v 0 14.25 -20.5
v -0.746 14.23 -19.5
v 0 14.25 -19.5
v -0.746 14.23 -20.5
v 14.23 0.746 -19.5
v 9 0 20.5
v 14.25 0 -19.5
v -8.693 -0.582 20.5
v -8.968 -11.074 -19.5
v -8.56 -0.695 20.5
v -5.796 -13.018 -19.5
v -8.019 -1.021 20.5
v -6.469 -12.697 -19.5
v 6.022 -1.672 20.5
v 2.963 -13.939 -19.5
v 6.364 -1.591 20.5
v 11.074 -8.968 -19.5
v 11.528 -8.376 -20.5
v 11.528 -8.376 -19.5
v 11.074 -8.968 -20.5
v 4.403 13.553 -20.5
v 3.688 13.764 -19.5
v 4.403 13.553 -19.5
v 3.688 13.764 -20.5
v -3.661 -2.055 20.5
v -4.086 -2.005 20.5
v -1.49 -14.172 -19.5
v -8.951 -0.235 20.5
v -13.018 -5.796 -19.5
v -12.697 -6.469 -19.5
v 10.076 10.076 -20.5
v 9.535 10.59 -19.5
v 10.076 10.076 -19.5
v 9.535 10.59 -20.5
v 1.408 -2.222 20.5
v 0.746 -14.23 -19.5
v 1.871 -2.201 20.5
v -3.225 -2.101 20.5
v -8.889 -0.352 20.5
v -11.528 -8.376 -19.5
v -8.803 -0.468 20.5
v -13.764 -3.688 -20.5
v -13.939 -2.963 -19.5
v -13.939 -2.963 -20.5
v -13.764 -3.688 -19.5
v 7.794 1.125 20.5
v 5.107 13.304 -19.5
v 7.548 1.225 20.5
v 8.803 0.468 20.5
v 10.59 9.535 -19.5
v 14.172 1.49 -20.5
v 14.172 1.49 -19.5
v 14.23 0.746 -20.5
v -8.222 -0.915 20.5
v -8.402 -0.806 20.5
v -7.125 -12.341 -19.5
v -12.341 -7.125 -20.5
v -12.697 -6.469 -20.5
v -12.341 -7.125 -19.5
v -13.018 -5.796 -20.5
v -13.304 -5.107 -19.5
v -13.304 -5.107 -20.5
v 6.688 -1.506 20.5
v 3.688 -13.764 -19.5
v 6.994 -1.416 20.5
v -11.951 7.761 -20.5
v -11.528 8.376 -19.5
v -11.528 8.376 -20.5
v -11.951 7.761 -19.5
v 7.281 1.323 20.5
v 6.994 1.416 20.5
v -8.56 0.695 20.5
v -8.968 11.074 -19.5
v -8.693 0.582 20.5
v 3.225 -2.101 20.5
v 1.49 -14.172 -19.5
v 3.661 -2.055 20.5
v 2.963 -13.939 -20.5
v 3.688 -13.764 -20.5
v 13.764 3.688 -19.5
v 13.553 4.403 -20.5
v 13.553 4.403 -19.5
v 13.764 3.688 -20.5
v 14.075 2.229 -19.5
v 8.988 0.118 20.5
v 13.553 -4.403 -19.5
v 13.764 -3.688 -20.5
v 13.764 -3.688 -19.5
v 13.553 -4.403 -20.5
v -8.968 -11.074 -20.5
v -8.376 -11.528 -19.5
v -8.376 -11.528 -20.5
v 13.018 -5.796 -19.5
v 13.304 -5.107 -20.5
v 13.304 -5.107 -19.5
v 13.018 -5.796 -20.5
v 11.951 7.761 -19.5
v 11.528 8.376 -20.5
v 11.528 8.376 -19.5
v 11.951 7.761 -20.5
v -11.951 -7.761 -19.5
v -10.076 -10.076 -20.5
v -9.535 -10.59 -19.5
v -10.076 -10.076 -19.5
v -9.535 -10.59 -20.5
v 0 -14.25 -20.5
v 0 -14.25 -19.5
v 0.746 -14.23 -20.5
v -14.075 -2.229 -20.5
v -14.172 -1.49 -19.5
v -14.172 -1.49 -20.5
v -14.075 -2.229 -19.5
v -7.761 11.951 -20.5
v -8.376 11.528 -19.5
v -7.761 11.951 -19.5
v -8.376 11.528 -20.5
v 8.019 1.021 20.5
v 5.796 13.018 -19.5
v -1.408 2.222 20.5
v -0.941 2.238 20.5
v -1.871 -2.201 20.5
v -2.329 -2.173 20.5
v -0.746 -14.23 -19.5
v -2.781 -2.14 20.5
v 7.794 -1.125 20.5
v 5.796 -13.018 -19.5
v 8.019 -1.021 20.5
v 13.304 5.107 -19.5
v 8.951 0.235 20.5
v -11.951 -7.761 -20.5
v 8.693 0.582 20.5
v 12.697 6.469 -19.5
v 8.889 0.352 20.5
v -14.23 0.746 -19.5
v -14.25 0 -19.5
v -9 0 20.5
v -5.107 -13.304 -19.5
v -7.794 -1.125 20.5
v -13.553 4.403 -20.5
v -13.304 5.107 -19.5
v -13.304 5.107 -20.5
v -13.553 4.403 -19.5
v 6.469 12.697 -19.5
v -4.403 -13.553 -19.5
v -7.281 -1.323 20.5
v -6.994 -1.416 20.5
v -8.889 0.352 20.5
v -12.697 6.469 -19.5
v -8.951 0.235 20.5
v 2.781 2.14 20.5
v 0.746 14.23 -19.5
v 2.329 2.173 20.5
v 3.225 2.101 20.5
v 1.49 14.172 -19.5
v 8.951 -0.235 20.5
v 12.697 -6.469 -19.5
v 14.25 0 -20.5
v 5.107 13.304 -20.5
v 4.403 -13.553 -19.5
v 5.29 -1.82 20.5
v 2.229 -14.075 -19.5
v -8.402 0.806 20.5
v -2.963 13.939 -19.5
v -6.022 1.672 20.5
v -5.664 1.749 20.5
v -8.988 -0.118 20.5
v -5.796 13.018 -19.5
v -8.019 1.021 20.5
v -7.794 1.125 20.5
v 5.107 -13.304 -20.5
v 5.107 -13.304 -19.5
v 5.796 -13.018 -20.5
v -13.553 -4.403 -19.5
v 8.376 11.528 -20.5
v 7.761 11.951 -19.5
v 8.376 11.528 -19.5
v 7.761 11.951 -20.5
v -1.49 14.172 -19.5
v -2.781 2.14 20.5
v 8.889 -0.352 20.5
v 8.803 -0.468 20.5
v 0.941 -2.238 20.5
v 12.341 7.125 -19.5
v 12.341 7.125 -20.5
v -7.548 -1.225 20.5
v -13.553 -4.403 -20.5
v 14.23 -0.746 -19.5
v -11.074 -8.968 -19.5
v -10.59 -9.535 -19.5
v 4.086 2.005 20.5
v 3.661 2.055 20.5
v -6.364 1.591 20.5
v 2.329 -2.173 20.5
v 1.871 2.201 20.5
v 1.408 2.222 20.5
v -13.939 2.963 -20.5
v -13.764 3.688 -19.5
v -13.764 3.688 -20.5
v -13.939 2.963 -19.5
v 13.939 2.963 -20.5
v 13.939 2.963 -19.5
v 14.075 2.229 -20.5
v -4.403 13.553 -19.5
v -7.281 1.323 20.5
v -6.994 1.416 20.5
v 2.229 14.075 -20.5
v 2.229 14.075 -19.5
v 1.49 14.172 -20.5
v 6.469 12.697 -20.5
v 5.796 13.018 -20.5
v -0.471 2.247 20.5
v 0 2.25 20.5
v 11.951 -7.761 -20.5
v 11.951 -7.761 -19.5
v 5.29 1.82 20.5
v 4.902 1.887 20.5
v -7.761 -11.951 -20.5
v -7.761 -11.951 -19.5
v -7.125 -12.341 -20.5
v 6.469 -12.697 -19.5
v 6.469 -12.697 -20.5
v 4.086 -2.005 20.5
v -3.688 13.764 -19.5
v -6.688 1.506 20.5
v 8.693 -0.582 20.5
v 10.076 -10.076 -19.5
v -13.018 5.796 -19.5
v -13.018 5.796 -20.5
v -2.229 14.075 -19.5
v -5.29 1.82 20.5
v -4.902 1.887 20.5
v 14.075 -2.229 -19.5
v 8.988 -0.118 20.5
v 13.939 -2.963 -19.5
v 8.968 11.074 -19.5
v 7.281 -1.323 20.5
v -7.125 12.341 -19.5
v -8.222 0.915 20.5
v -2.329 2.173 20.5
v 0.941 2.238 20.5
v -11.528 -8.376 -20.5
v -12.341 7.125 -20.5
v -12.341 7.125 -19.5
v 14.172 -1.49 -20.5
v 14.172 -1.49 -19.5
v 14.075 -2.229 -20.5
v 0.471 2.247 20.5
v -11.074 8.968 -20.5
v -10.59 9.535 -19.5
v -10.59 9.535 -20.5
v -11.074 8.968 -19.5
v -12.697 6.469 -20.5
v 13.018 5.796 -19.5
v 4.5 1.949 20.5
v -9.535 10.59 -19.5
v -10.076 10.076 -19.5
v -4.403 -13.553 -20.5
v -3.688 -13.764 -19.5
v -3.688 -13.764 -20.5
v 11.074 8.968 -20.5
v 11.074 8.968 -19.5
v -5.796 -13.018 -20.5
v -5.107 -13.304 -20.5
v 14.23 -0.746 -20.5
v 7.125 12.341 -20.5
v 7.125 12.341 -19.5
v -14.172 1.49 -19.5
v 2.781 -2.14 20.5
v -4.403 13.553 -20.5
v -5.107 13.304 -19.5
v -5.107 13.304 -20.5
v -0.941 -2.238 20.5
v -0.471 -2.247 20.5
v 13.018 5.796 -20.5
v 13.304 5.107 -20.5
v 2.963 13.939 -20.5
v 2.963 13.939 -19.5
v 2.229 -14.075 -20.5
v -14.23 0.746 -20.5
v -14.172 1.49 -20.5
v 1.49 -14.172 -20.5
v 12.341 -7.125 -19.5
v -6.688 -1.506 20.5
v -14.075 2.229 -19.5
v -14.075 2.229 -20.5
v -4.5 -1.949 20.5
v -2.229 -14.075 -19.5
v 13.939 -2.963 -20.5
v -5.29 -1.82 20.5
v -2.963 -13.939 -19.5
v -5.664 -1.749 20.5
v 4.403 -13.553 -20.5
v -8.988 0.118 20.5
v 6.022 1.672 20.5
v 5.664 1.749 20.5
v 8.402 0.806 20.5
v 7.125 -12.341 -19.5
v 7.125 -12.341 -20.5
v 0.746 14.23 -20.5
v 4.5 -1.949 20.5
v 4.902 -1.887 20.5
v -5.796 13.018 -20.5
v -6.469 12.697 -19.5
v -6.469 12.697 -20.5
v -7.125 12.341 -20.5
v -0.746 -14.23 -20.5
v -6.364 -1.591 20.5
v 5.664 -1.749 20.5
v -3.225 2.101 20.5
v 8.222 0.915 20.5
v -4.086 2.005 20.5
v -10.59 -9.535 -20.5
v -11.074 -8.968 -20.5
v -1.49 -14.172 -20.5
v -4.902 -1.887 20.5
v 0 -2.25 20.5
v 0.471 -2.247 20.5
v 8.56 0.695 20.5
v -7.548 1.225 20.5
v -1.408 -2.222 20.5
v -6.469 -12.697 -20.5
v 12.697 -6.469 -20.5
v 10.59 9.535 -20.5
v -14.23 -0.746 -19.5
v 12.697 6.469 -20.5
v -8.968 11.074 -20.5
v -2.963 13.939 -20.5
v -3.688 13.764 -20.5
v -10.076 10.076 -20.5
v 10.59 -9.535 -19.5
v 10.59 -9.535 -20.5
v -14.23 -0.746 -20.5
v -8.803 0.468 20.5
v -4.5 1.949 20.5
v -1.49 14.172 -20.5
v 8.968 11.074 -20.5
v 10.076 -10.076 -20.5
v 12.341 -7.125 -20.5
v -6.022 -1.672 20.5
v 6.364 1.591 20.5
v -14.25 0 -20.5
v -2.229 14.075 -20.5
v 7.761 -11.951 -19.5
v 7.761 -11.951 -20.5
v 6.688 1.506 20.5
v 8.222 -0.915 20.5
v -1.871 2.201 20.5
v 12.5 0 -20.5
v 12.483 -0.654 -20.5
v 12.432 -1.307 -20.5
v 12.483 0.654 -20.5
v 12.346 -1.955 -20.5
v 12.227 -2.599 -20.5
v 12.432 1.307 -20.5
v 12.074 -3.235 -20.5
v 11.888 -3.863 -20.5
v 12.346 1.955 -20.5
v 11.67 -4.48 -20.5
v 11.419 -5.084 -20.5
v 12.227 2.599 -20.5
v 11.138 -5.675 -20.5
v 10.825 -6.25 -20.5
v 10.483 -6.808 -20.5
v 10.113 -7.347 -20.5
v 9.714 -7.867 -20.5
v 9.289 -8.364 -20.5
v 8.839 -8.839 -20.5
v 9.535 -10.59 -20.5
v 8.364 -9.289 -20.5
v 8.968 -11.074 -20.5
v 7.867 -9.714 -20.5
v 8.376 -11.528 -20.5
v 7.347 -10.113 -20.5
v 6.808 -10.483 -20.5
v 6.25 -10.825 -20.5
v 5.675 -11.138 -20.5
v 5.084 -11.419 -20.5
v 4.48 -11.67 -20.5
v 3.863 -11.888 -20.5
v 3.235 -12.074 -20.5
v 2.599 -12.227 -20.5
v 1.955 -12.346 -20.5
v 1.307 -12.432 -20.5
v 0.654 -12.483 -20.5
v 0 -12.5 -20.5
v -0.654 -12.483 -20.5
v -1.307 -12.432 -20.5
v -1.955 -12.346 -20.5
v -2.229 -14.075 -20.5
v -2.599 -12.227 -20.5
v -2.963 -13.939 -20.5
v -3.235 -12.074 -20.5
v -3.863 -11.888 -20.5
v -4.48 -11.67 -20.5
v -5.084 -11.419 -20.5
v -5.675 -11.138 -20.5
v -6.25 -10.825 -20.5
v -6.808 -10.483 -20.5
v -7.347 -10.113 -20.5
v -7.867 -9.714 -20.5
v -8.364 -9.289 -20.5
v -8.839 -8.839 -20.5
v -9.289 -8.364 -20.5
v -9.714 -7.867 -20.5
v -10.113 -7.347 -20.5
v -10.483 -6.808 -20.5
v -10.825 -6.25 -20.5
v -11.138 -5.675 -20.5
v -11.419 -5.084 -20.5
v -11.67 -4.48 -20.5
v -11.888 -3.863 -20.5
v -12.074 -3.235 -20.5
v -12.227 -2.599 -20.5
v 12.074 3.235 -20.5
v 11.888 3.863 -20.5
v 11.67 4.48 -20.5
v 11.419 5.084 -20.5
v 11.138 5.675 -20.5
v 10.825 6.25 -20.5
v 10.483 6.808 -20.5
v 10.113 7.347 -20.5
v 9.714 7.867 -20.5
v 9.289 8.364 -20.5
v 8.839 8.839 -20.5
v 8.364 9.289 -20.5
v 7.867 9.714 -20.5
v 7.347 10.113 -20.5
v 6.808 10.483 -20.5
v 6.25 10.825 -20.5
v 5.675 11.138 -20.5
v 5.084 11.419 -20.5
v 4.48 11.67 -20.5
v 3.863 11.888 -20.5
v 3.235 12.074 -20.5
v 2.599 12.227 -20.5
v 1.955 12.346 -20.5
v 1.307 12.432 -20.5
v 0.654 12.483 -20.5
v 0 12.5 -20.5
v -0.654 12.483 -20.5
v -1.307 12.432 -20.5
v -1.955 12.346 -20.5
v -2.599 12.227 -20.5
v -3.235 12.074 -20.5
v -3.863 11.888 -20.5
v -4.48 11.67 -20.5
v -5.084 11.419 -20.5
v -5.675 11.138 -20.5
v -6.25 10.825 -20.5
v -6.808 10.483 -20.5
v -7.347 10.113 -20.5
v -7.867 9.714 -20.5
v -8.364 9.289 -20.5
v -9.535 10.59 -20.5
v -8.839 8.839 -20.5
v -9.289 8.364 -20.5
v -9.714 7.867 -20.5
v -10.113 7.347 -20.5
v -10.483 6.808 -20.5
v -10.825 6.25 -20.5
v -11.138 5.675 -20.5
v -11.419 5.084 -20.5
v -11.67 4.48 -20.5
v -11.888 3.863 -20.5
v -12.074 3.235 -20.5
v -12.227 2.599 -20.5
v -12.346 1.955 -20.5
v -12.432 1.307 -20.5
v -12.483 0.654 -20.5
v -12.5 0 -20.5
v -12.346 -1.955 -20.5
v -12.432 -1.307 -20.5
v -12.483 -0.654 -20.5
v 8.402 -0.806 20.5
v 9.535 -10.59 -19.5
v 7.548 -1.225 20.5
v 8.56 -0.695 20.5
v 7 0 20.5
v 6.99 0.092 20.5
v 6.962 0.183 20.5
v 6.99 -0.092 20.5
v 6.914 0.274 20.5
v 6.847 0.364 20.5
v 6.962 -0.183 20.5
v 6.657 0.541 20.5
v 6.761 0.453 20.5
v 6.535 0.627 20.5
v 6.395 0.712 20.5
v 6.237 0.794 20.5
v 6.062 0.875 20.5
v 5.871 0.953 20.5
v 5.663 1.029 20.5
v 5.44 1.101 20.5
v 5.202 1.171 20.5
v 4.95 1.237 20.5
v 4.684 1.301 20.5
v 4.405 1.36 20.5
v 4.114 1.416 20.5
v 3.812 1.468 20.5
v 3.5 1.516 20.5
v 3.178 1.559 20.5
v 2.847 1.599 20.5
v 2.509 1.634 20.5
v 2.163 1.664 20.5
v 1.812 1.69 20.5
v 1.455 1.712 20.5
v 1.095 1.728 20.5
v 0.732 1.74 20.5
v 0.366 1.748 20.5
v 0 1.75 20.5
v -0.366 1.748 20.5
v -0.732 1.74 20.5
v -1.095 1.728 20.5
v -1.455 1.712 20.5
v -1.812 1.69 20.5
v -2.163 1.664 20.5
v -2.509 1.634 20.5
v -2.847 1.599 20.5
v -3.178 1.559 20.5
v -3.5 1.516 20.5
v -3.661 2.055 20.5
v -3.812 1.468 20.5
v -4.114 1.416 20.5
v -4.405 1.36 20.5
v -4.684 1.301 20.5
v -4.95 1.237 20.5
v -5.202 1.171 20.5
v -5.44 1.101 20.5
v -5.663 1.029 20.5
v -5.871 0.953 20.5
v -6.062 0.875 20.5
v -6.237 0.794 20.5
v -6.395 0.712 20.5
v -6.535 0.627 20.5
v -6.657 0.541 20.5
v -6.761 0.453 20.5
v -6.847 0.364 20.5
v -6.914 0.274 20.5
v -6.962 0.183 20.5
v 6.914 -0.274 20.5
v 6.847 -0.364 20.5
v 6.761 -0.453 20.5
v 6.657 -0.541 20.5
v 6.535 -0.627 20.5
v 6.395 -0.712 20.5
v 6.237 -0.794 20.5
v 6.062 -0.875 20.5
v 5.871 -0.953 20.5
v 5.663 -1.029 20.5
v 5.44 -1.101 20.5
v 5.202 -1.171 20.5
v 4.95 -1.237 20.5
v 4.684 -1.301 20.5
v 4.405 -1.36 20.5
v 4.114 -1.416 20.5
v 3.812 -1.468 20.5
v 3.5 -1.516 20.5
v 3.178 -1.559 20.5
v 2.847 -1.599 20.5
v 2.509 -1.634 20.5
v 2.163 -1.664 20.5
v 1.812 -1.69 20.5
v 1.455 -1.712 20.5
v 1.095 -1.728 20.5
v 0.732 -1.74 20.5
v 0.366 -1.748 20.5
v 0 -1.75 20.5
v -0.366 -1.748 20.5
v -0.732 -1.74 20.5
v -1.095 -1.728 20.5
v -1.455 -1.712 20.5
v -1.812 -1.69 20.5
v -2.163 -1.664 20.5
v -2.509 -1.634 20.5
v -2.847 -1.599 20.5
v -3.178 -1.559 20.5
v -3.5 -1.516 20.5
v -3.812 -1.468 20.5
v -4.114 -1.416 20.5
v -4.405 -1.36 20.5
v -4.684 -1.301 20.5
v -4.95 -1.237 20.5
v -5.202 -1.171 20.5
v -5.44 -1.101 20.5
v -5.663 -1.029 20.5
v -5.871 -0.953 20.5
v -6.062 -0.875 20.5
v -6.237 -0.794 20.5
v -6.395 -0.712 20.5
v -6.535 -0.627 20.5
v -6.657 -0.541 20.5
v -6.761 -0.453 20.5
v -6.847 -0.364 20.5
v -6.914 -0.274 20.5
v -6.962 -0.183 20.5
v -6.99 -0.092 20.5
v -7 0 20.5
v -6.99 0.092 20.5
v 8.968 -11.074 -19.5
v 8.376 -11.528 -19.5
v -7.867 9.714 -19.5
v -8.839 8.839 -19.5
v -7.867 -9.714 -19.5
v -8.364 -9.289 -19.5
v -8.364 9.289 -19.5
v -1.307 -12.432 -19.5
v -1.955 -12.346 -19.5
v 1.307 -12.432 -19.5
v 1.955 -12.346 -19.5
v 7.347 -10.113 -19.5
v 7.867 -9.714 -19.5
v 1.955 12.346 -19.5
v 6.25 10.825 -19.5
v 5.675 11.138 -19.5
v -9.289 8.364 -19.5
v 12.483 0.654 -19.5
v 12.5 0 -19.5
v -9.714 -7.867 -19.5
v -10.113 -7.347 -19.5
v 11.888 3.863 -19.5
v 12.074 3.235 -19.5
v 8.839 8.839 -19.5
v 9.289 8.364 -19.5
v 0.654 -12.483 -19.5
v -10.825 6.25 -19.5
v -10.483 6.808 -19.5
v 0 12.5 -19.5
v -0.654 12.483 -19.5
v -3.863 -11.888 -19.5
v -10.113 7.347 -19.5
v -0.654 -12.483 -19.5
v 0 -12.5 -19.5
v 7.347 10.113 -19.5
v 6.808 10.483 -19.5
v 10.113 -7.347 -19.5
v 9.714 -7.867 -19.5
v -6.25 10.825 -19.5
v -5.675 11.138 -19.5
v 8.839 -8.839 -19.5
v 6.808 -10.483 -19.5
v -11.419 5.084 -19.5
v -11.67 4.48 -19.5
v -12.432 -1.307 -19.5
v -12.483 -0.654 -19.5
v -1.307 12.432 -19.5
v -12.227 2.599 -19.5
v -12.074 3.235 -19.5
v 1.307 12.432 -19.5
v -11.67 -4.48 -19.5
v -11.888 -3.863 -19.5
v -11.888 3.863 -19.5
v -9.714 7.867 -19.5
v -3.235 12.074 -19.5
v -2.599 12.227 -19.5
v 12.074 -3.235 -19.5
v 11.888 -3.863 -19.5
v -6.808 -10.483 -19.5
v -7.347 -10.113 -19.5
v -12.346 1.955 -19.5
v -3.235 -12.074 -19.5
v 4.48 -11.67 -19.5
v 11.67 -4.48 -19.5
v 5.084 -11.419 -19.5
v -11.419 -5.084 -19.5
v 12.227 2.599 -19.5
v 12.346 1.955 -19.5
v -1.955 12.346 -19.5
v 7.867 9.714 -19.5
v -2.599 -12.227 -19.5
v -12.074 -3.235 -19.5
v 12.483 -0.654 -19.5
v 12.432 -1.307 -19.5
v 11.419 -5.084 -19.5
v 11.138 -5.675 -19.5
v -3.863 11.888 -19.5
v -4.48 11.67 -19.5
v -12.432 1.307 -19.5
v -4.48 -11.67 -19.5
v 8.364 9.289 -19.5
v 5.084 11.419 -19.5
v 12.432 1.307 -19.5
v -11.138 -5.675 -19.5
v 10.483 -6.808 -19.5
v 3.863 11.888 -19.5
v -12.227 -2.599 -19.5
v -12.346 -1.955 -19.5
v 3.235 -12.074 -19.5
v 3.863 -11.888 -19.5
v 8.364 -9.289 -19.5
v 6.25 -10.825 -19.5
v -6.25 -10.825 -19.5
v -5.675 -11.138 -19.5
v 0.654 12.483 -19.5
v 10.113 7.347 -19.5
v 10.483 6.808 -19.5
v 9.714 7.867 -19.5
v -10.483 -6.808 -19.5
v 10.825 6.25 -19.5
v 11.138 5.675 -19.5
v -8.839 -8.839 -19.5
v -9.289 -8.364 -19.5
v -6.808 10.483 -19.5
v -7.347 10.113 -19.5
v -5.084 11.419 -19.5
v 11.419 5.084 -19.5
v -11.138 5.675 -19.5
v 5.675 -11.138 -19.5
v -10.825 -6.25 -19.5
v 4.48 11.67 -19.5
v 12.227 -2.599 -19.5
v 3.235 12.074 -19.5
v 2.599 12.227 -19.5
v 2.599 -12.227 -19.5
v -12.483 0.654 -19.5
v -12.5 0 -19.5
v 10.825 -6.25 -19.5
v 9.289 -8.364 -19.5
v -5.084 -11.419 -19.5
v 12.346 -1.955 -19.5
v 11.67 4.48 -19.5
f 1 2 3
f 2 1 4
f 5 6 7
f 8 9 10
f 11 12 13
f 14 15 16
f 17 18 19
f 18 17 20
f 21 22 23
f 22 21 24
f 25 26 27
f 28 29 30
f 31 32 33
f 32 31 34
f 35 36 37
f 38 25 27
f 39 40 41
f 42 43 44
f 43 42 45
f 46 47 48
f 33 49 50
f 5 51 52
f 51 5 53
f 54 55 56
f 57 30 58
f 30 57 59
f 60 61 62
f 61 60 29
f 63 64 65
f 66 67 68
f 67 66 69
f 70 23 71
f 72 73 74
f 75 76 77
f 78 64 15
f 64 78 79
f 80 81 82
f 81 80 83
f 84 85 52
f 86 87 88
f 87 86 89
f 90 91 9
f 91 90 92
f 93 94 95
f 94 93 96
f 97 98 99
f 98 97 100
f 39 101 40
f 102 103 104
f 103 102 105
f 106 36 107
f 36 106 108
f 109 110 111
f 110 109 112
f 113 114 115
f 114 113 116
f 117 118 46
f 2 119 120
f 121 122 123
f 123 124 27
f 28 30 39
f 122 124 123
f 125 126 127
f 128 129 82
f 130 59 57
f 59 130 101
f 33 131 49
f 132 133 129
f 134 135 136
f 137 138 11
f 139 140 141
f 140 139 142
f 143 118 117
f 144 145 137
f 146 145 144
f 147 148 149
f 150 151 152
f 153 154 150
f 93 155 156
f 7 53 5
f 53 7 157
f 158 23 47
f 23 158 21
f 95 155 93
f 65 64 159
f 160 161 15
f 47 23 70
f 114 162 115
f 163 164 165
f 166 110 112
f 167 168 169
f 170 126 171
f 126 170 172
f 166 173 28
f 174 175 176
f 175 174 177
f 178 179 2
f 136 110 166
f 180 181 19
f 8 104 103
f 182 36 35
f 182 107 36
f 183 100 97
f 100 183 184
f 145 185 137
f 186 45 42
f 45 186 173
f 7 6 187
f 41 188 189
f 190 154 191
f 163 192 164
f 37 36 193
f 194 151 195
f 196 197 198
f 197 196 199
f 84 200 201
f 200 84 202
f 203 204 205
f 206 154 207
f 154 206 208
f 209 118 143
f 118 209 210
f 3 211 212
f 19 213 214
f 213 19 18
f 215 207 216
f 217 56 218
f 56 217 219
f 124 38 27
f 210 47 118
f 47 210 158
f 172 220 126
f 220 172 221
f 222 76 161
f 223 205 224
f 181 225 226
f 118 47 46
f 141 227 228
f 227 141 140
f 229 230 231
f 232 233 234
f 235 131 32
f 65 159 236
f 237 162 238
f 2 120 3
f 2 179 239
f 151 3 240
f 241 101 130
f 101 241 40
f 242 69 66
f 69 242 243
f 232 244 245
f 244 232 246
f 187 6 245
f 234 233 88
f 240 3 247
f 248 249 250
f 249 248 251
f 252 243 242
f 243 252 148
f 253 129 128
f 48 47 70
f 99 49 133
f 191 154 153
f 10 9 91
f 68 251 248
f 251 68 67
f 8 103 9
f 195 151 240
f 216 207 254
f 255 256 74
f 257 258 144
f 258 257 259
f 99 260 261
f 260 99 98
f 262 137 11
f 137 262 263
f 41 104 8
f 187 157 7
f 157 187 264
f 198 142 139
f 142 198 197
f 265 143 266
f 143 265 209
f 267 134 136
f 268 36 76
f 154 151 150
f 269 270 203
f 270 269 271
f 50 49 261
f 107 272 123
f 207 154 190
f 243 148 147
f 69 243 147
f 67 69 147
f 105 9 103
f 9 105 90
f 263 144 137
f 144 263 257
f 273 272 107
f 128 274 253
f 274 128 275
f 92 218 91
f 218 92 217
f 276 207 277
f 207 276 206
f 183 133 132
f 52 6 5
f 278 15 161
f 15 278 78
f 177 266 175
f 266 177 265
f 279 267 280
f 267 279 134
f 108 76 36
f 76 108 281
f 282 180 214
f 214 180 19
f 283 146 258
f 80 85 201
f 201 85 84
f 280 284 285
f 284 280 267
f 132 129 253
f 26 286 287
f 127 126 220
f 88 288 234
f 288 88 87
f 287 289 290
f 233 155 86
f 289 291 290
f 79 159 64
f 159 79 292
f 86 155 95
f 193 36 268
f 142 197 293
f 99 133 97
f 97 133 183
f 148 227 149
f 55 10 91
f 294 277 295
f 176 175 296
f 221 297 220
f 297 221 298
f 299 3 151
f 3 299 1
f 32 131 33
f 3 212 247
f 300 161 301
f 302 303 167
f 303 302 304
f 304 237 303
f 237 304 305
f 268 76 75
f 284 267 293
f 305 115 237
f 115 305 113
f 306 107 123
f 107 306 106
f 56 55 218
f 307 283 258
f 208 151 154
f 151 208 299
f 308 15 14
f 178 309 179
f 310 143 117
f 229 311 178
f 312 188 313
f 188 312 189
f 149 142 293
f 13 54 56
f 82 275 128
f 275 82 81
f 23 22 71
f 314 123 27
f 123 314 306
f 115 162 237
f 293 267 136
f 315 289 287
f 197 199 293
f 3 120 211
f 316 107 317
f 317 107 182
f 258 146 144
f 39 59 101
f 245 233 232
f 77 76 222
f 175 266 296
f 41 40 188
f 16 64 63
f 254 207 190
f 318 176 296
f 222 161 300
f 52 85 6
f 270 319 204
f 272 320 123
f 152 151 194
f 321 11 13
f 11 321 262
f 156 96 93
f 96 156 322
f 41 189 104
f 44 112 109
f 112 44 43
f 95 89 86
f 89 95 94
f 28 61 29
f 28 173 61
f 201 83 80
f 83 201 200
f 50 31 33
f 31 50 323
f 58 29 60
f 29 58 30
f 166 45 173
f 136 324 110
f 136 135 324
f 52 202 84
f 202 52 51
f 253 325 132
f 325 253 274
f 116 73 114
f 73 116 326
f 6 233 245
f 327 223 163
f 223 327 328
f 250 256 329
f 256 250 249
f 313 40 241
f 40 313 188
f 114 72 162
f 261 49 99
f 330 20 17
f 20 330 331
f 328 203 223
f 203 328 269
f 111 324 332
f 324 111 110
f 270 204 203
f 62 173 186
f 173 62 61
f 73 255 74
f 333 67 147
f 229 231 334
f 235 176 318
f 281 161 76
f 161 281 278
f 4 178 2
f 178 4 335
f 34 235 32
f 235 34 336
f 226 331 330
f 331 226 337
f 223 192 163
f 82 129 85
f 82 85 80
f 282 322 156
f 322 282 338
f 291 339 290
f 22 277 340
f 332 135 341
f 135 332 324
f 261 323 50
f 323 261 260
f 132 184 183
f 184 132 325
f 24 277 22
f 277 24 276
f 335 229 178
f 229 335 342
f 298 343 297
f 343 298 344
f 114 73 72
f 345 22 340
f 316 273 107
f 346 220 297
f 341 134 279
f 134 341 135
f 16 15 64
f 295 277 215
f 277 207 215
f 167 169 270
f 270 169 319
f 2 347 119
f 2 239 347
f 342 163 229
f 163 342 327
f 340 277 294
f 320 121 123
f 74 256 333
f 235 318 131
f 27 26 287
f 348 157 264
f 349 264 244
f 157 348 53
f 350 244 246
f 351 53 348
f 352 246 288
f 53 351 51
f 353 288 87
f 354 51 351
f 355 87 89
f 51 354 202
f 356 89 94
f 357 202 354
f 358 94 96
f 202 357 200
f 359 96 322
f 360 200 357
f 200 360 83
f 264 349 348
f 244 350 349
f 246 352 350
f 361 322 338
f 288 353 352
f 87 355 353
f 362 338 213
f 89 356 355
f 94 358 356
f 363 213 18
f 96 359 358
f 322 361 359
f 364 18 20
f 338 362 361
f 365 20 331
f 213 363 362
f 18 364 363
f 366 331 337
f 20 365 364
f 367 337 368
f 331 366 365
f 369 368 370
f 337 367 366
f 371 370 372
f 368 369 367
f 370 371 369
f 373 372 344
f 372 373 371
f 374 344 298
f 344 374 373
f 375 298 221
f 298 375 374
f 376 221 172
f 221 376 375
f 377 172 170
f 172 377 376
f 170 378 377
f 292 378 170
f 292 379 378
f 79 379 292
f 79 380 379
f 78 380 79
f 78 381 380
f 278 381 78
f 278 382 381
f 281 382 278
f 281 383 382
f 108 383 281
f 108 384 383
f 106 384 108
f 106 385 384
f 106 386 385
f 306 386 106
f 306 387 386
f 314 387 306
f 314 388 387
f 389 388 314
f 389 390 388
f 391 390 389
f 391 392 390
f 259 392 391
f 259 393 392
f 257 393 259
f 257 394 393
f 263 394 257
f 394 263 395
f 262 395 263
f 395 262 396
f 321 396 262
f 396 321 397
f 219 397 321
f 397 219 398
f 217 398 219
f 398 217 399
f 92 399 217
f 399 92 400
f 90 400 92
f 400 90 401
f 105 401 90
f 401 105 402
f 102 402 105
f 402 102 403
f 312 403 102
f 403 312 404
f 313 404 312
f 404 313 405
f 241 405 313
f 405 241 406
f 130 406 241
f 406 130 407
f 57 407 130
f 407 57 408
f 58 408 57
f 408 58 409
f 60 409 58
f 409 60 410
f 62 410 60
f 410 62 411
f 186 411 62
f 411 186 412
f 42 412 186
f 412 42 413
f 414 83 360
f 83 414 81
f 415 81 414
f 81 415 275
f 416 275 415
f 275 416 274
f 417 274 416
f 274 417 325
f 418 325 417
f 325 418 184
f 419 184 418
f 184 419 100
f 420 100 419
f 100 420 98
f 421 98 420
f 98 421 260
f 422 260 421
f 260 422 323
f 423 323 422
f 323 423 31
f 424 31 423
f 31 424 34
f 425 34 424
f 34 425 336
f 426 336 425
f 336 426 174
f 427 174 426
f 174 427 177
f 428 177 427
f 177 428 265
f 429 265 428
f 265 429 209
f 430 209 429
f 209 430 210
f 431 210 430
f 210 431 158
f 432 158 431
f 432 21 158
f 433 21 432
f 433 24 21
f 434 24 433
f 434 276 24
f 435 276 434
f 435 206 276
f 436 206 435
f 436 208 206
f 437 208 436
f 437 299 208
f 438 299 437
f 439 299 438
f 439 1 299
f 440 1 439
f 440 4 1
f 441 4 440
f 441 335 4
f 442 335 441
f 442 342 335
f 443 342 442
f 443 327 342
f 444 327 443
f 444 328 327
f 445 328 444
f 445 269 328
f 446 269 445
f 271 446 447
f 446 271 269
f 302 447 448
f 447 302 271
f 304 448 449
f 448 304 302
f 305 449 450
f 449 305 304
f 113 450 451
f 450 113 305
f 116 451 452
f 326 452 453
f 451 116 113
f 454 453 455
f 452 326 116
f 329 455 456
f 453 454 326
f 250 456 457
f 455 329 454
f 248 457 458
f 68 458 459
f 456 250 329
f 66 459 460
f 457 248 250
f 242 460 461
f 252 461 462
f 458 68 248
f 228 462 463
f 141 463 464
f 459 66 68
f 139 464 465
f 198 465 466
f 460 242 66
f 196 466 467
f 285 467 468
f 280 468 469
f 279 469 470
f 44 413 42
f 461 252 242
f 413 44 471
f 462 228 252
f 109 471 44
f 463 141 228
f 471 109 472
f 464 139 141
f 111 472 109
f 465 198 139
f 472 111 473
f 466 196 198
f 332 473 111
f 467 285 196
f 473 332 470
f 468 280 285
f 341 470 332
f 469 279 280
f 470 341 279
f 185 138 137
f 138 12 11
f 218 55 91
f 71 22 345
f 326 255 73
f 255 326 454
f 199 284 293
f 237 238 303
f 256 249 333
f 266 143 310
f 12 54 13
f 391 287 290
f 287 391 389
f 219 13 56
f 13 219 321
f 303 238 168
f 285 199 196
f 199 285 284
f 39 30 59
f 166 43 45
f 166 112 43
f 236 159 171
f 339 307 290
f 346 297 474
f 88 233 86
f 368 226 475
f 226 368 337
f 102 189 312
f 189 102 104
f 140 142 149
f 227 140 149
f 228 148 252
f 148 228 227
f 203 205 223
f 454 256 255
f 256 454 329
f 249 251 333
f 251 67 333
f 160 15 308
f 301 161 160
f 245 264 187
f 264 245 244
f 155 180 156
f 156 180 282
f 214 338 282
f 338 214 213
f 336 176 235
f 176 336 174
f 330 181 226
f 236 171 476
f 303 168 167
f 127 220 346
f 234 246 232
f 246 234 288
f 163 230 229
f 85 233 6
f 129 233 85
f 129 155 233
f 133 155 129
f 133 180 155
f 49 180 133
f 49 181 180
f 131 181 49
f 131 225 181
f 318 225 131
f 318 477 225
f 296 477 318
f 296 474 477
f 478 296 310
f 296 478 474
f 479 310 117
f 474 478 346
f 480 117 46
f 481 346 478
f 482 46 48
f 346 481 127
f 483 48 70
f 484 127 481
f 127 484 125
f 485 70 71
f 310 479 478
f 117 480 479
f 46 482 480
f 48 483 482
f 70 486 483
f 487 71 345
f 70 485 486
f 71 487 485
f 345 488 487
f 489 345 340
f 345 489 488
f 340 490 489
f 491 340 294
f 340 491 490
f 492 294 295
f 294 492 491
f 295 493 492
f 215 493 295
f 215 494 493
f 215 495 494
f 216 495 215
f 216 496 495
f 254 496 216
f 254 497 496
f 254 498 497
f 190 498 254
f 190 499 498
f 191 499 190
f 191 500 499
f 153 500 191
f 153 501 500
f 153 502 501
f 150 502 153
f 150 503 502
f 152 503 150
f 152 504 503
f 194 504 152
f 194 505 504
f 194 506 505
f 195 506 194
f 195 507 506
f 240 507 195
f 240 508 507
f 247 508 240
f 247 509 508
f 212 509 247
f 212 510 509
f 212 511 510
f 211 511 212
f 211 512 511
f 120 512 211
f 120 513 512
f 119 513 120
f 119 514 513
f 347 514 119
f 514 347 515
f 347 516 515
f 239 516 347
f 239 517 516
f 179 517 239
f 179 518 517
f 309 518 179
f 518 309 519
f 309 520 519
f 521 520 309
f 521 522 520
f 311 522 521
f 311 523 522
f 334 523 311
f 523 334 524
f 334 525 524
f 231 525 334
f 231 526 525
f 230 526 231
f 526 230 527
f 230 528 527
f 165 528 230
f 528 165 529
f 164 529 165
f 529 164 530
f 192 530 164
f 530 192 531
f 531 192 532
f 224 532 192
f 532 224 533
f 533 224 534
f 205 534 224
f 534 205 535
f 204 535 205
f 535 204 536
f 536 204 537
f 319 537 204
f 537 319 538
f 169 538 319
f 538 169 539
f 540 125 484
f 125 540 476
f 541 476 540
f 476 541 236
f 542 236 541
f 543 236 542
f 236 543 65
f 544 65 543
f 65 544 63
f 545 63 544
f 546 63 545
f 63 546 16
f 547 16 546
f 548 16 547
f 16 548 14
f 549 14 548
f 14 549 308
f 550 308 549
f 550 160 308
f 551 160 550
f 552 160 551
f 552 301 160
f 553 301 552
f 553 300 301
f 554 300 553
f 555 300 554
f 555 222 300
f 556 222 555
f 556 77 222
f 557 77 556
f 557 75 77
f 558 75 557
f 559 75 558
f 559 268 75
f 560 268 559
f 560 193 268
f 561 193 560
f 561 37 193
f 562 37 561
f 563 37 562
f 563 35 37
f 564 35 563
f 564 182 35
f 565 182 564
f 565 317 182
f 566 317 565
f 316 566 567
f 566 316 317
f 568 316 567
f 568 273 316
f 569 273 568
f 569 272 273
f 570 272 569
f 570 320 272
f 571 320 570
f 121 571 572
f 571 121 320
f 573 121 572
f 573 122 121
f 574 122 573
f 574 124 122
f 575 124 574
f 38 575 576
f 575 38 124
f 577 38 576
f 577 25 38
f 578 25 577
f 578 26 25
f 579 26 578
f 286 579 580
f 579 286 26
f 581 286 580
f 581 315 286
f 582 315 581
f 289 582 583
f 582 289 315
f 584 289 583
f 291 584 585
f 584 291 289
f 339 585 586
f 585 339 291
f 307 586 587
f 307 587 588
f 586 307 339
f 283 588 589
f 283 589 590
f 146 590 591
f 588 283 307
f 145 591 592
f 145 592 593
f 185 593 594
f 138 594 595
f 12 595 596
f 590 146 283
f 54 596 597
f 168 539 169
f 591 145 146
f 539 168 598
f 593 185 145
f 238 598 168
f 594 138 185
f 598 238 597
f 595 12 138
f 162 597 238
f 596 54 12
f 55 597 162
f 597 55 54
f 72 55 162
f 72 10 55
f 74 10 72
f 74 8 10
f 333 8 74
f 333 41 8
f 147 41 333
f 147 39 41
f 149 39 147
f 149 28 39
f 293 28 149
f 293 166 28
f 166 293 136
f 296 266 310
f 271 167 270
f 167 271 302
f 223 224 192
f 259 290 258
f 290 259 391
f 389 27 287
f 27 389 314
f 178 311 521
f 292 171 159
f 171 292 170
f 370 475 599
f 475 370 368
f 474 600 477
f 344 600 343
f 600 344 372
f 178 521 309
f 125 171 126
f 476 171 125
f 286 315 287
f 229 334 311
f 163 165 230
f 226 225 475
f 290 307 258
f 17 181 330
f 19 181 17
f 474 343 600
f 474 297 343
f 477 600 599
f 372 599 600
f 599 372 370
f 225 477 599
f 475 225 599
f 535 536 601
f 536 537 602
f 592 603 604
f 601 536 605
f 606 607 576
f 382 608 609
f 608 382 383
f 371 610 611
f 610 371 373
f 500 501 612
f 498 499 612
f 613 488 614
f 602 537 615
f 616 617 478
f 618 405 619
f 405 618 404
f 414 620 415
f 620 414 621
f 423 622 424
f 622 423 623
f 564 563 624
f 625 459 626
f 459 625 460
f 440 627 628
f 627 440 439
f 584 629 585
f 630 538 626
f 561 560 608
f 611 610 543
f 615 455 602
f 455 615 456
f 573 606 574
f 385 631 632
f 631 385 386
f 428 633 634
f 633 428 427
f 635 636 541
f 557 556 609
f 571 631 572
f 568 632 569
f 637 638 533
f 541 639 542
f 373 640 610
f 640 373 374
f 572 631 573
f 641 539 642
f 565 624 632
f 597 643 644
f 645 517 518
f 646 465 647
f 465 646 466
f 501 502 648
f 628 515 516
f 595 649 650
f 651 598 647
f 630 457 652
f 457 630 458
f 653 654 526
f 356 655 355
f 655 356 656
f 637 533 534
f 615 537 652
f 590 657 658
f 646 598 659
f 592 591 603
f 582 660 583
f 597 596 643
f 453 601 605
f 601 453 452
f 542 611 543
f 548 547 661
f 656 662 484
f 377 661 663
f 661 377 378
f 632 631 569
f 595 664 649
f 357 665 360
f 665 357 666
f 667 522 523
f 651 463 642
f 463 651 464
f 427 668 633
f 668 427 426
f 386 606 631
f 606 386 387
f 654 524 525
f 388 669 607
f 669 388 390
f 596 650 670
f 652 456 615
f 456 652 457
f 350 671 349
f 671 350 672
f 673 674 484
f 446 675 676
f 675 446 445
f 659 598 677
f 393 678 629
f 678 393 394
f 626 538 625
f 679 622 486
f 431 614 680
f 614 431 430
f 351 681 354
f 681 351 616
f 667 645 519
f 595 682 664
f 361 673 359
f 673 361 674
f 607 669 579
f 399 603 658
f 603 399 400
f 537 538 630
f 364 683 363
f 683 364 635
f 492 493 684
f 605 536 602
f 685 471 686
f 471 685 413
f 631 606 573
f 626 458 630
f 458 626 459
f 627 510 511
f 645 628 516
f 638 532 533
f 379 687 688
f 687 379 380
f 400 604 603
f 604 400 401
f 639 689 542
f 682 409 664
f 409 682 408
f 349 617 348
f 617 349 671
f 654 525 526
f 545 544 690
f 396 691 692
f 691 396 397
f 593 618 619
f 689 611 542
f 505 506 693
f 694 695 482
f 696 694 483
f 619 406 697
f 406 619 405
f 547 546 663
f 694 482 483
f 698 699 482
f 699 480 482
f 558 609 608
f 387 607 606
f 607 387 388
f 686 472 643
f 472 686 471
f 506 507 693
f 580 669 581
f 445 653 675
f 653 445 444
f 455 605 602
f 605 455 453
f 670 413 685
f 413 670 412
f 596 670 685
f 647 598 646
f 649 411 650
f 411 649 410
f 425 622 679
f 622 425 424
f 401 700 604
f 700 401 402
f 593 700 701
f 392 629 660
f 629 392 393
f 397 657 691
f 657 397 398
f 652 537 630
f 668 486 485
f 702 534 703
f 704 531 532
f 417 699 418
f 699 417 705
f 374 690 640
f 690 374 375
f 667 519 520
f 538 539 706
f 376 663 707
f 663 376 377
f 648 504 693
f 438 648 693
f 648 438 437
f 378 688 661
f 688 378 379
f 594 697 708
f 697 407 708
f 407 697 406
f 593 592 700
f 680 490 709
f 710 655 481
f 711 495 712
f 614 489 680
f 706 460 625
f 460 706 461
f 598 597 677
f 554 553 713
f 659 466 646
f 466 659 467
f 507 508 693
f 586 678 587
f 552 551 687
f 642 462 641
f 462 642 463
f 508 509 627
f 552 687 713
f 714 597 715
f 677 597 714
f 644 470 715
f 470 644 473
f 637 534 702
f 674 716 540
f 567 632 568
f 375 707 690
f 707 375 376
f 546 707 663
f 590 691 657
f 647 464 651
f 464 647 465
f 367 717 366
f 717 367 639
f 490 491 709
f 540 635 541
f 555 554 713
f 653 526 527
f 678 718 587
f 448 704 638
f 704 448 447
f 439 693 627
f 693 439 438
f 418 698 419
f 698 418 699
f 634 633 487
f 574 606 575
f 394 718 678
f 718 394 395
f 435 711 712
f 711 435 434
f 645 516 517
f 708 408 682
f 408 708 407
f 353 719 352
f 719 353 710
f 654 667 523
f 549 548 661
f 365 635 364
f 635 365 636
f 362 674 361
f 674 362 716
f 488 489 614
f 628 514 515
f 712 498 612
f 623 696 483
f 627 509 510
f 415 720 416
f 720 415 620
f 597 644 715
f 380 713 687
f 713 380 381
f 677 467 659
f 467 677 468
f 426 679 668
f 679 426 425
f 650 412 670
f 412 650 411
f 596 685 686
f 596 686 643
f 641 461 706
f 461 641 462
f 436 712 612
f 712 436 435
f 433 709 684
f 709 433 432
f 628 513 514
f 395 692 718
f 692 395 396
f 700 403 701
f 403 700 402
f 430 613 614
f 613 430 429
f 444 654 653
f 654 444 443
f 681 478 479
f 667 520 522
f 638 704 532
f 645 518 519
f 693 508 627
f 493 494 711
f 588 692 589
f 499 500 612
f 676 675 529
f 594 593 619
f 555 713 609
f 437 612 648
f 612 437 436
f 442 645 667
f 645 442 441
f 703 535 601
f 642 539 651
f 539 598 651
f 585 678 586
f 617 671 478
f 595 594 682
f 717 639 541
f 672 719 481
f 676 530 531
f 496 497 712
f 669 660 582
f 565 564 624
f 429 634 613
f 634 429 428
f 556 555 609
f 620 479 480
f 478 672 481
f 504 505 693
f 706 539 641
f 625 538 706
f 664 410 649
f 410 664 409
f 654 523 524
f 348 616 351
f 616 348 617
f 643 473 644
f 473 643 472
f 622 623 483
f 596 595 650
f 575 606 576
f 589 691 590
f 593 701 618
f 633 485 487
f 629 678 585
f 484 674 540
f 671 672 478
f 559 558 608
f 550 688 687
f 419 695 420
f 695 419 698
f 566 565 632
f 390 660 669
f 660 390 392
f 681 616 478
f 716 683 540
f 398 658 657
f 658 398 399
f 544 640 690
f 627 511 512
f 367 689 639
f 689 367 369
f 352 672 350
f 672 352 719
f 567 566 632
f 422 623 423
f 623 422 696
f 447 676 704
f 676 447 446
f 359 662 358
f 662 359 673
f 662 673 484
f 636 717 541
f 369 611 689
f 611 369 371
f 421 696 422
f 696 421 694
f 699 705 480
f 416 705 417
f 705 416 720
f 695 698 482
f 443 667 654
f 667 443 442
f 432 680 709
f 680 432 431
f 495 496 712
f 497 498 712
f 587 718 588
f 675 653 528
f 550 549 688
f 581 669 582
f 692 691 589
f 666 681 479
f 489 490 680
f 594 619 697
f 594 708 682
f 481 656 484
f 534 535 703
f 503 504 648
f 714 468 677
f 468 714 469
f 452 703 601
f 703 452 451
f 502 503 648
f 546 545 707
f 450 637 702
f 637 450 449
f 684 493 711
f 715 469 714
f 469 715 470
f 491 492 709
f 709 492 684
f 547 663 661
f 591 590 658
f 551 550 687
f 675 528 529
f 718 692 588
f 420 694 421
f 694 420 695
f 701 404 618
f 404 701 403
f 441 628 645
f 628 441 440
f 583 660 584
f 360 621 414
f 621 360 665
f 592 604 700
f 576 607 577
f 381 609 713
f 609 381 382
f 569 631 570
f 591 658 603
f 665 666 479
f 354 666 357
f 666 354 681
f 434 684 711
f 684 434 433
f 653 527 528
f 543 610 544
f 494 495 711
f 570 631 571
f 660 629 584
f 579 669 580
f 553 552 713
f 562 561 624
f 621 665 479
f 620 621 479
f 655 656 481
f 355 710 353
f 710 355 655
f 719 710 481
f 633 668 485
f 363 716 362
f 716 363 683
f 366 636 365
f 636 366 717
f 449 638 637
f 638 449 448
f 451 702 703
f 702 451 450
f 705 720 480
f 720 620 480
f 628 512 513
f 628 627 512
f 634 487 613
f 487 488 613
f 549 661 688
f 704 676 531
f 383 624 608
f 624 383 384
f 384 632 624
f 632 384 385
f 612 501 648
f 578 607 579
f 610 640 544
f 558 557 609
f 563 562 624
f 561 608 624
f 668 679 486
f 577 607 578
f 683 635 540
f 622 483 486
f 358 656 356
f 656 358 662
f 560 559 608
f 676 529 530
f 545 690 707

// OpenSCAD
/*
    Nozzle Creation Script
        - built for generating nozzles
        - my specific use is for laying grout
*/

//Wider nozzle end, inner diameter
lower_dia_in = 25; //[20:0.5:100]

//Thinner nozzle end, innet diameter
upper_dia_in = 7; //[4:0.1:50]

//length from bottom to top
length = 40; //[8:0.1:150]

//Nozzle X Scale
nozzle_x_scale = 2.0; //[0.25:0.1:2.0]

//Nozzle Y Scale
nozzle_y_scale = 0.5; //[0.25:0.1:2.0]

//Wall thickness at base
wall_thickness_upper = 2; //[1:0.1:15]

//Wall thickness at nozzle
wall_thickness_lower = 3.5; //[1:0.1:20]

//Smoothness - Resolution of the circles
resolution = 120; //[32:1:240]


//RENDER
difference(){
    outer_wall();
    inner_wall();
}

//MODULES
module outer_wall(){
    hull(){
translate([0,0,length/2]){
upper_nozzle(wall_thickness_upper);
}

translate([0,0,-length/2]){
lower_nozzle(wall_thickness_lower);
}
}
}

module inner_wall(){
    hull(){
translate([0,0,length/2]){
upper_nozzle(0);
}

translate([0,0,-length/2]){
lower_nozzle(0);
}
}
}


module lower_nozzle(thickness){
    cylinder(h = 1, d = lower_dia_in + thickness, center = true, $fn = resolution); 
}

module upper_nozzle(thickness){
    scale([nozzle_x_scale, nozzle_y_scale,1]){
            cylinder(h = 1, d = upper_dia_in + thickness, center = true, $fn = resolution); 
    }
}
